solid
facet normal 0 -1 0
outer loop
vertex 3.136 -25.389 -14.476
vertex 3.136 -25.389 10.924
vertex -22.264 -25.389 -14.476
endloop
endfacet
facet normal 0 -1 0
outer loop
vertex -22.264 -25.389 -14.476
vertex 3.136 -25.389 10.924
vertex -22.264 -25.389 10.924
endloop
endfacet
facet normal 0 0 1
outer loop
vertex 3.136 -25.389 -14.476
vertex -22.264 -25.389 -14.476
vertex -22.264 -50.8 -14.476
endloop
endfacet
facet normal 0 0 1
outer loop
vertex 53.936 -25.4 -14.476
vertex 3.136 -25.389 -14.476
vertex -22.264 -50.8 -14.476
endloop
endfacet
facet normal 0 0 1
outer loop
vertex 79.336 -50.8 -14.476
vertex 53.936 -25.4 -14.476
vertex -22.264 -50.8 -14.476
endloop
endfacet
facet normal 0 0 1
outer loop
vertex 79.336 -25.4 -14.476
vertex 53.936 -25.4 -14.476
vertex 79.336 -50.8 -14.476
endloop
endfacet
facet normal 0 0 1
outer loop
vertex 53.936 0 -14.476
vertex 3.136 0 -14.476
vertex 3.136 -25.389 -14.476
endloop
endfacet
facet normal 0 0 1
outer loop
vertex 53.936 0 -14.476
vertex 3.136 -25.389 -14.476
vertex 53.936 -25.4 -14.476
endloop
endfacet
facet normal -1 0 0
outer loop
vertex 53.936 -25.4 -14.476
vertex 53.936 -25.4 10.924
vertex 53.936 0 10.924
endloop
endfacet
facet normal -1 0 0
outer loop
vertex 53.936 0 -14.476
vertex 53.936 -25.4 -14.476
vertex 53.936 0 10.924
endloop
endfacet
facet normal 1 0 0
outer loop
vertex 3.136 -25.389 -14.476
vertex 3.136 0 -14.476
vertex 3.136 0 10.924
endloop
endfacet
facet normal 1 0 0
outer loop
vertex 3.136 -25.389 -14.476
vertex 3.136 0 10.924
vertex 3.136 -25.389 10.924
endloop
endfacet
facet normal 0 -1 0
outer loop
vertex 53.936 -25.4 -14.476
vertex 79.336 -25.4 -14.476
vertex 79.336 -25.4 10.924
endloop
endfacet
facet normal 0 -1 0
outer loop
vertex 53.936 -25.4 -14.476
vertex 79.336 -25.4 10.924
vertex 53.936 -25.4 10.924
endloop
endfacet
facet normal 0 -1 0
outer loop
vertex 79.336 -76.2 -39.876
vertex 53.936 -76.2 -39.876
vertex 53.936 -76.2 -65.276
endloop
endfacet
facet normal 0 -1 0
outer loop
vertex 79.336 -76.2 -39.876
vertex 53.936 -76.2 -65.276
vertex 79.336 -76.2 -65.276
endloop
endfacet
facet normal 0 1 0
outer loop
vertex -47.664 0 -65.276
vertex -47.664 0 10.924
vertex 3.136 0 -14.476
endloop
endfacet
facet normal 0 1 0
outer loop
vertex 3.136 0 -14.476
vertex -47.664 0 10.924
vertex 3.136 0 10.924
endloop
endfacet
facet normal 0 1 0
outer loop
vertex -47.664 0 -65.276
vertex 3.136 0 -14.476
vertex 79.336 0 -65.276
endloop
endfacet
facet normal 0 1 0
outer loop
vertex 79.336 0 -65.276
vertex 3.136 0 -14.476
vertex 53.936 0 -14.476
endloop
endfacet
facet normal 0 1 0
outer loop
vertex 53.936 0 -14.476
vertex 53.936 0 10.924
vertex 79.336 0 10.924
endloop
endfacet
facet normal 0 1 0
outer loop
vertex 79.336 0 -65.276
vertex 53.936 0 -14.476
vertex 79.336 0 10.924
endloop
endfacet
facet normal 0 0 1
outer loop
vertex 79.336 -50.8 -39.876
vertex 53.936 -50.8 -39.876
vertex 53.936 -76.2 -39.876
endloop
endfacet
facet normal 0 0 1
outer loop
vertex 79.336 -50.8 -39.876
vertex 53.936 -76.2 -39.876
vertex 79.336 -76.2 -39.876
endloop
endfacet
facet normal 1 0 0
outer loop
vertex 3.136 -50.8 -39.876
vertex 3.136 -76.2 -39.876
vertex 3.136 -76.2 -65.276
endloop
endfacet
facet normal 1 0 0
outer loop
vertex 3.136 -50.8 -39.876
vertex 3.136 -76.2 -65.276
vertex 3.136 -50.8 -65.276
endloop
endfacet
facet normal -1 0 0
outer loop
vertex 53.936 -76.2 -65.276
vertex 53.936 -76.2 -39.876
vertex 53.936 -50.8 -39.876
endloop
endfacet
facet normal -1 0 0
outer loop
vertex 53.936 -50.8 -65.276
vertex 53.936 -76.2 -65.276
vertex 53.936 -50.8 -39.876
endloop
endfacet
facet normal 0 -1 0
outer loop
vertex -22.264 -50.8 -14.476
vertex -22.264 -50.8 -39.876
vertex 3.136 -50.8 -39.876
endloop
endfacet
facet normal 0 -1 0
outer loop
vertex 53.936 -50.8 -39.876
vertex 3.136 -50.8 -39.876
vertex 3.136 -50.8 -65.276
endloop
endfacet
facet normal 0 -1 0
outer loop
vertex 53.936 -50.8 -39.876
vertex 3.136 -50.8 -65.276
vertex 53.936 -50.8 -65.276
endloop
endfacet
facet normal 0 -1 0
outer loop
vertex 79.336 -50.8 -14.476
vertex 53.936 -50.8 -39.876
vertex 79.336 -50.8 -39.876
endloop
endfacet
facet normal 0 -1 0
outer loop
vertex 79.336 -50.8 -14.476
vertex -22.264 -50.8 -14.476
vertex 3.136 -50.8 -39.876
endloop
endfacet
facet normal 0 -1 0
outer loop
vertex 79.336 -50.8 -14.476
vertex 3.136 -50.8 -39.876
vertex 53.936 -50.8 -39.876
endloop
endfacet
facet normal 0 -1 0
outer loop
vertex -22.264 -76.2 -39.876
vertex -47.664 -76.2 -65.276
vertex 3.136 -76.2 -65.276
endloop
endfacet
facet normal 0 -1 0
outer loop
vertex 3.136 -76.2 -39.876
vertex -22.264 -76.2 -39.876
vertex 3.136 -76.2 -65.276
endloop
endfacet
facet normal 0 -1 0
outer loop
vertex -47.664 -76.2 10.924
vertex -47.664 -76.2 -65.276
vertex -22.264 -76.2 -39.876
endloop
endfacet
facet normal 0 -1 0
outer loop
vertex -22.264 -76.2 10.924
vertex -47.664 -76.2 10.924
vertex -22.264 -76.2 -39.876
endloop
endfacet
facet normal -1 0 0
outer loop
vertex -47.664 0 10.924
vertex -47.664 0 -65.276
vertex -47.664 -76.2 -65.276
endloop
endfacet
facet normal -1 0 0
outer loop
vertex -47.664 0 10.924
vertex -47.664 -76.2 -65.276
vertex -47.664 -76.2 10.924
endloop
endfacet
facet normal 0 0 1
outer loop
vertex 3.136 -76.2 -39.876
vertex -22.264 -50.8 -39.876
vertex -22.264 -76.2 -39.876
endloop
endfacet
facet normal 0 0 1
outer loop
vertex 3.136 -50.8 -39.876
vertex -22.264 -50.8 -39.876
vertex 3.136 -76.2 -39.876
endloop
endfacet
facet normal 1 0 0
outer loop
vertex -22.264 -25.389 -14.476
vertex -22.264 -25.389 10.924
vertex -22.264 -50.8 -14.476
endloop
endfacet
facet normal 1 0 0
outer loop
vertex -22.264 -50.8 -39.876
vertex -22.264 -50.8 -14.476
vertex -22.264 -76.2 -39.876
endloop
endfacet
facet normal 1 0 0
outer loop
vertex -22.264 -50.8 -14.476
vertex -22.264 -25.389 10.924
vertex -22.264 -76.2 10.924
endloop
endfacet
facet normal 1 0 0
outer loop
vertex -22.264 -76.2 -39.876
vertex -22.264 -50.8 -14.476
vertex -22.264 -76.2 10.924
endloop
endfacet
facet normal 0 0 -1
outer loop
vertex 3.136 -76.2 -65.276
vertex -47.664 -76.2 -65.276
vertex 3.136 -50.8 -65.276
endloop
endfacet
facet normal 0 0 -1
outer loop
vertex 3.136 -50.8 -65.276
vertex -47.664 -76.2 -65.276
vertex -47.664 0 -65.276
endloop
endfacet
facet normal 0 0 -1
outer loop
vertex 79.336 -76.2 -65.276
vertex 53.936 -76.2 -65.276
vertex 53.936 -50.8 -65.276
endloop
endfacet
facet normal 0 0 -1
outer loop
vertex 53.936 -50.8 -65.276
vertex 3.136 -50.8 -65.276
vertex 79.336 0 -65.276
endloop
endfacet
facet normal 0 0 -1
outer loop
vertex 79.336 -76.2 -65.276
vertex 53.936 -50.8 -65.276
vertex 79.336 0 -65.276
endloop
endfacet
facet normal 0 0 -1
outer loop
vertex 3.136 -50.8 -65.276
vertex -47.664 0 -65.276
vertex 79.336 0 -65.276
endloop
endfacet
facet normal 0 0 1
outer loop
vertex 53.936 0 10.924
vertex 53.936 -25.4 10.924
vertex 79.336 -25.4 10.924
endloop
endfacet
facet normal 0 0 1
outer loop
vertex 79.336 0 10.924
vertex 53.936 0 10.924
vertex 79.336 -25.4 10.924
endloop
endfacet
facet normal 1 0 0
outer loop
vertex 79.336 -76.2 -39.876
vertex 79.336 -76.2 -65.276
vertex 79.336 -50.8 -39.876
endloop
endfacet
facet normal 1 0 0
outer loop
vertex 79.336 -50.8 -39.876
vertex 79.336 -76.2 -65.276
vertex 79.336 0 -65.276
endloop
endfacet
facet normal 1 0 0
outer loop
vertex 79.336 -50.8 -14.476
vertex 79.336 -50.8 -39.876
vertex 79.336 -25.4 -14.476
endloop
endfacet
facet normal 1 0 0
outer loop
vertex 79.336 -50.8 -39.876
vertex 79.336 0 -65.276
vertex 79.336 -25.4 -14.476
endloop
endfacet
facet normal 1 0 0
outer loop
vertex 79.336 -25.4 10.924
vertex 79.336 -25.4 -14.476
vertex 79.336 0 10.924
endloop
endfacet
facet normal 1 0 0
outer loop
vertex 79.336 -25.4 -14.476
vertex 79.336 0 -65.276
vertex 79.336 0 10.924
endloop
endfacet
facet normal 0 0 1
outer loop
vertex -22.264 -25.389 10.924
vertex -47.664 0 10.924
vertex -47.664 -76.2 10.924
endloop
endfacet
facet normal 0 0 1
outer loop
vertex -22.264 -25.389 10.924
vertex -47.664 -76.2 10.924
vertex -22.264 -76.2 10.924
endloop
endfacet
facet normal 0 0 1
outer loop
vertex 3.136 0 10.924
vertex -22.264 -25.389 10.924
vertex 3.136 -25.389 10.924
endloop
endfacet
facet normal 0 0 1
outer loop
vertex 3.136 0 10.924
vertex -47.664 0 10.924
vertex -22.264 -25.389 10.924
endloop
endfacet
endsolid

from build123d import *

# Parameters (mm, degrees)
F0_W     = 127
F0_H     = 76.2
F1_DEPTH = 76.2
F2_W     = 50.8
F2_H     = 25.4
F3_DEPTH = 86.868
F2_W_2   = 25.4
F4_DEPTH = 50.8
F5_DEPTH = 25.4


with BuildPart() as f1:
    # F0 (on Front) → F1 (new body)
    with BuildSketch(Plane.XZ):
        with Locations((15.835898, -27.176369)):
            Rectangle(F0_W, F0_H)
    extrude(amount=F1_DEPTH)

    # F2 (on face) → F3 (cut)
    with BuildSketch(Plane.XY.offset(10.923631)):
        with Locations((28.535898, -63.5)):
            Rectangle(F2_W, F2_H)
    extrude(amount=-F3_DEPTH, mode=Mode.SUBTRACT)

    # F2 (on face) → F4 (cut)
    with BuildSketch(Plane.XY.offset(10.923631)):
        with Locations((-9.564102, -63.5)):
            Rectangle(F2_W_2, F2_H)
        with Locations((66.635898, -63.5)):
            Rectangle(F2_W_2, F2_H)
    extrude(amount=-F4_DEPTH, mode=Mode.SUBTRACT)

    # F2 (on face) → F5 (cut)
    with BuildSketch(Plane.XY.offset(10.923631)):
        Polygon((53.935898, -25.4), (53.935898, 0), (3.135898, 0), (3.135898, -25.38896), (-22.264102, -25.38896), (-22.264102, -50.8), (3.135898, -50.8), (53.935898, -50.8), (79.335898, -50.8), (79.335898, -25.4), align=None)
    extrude(amount=-F5_DEPTH, mode=Mode.SUBTRACT)


solid = f1.part
